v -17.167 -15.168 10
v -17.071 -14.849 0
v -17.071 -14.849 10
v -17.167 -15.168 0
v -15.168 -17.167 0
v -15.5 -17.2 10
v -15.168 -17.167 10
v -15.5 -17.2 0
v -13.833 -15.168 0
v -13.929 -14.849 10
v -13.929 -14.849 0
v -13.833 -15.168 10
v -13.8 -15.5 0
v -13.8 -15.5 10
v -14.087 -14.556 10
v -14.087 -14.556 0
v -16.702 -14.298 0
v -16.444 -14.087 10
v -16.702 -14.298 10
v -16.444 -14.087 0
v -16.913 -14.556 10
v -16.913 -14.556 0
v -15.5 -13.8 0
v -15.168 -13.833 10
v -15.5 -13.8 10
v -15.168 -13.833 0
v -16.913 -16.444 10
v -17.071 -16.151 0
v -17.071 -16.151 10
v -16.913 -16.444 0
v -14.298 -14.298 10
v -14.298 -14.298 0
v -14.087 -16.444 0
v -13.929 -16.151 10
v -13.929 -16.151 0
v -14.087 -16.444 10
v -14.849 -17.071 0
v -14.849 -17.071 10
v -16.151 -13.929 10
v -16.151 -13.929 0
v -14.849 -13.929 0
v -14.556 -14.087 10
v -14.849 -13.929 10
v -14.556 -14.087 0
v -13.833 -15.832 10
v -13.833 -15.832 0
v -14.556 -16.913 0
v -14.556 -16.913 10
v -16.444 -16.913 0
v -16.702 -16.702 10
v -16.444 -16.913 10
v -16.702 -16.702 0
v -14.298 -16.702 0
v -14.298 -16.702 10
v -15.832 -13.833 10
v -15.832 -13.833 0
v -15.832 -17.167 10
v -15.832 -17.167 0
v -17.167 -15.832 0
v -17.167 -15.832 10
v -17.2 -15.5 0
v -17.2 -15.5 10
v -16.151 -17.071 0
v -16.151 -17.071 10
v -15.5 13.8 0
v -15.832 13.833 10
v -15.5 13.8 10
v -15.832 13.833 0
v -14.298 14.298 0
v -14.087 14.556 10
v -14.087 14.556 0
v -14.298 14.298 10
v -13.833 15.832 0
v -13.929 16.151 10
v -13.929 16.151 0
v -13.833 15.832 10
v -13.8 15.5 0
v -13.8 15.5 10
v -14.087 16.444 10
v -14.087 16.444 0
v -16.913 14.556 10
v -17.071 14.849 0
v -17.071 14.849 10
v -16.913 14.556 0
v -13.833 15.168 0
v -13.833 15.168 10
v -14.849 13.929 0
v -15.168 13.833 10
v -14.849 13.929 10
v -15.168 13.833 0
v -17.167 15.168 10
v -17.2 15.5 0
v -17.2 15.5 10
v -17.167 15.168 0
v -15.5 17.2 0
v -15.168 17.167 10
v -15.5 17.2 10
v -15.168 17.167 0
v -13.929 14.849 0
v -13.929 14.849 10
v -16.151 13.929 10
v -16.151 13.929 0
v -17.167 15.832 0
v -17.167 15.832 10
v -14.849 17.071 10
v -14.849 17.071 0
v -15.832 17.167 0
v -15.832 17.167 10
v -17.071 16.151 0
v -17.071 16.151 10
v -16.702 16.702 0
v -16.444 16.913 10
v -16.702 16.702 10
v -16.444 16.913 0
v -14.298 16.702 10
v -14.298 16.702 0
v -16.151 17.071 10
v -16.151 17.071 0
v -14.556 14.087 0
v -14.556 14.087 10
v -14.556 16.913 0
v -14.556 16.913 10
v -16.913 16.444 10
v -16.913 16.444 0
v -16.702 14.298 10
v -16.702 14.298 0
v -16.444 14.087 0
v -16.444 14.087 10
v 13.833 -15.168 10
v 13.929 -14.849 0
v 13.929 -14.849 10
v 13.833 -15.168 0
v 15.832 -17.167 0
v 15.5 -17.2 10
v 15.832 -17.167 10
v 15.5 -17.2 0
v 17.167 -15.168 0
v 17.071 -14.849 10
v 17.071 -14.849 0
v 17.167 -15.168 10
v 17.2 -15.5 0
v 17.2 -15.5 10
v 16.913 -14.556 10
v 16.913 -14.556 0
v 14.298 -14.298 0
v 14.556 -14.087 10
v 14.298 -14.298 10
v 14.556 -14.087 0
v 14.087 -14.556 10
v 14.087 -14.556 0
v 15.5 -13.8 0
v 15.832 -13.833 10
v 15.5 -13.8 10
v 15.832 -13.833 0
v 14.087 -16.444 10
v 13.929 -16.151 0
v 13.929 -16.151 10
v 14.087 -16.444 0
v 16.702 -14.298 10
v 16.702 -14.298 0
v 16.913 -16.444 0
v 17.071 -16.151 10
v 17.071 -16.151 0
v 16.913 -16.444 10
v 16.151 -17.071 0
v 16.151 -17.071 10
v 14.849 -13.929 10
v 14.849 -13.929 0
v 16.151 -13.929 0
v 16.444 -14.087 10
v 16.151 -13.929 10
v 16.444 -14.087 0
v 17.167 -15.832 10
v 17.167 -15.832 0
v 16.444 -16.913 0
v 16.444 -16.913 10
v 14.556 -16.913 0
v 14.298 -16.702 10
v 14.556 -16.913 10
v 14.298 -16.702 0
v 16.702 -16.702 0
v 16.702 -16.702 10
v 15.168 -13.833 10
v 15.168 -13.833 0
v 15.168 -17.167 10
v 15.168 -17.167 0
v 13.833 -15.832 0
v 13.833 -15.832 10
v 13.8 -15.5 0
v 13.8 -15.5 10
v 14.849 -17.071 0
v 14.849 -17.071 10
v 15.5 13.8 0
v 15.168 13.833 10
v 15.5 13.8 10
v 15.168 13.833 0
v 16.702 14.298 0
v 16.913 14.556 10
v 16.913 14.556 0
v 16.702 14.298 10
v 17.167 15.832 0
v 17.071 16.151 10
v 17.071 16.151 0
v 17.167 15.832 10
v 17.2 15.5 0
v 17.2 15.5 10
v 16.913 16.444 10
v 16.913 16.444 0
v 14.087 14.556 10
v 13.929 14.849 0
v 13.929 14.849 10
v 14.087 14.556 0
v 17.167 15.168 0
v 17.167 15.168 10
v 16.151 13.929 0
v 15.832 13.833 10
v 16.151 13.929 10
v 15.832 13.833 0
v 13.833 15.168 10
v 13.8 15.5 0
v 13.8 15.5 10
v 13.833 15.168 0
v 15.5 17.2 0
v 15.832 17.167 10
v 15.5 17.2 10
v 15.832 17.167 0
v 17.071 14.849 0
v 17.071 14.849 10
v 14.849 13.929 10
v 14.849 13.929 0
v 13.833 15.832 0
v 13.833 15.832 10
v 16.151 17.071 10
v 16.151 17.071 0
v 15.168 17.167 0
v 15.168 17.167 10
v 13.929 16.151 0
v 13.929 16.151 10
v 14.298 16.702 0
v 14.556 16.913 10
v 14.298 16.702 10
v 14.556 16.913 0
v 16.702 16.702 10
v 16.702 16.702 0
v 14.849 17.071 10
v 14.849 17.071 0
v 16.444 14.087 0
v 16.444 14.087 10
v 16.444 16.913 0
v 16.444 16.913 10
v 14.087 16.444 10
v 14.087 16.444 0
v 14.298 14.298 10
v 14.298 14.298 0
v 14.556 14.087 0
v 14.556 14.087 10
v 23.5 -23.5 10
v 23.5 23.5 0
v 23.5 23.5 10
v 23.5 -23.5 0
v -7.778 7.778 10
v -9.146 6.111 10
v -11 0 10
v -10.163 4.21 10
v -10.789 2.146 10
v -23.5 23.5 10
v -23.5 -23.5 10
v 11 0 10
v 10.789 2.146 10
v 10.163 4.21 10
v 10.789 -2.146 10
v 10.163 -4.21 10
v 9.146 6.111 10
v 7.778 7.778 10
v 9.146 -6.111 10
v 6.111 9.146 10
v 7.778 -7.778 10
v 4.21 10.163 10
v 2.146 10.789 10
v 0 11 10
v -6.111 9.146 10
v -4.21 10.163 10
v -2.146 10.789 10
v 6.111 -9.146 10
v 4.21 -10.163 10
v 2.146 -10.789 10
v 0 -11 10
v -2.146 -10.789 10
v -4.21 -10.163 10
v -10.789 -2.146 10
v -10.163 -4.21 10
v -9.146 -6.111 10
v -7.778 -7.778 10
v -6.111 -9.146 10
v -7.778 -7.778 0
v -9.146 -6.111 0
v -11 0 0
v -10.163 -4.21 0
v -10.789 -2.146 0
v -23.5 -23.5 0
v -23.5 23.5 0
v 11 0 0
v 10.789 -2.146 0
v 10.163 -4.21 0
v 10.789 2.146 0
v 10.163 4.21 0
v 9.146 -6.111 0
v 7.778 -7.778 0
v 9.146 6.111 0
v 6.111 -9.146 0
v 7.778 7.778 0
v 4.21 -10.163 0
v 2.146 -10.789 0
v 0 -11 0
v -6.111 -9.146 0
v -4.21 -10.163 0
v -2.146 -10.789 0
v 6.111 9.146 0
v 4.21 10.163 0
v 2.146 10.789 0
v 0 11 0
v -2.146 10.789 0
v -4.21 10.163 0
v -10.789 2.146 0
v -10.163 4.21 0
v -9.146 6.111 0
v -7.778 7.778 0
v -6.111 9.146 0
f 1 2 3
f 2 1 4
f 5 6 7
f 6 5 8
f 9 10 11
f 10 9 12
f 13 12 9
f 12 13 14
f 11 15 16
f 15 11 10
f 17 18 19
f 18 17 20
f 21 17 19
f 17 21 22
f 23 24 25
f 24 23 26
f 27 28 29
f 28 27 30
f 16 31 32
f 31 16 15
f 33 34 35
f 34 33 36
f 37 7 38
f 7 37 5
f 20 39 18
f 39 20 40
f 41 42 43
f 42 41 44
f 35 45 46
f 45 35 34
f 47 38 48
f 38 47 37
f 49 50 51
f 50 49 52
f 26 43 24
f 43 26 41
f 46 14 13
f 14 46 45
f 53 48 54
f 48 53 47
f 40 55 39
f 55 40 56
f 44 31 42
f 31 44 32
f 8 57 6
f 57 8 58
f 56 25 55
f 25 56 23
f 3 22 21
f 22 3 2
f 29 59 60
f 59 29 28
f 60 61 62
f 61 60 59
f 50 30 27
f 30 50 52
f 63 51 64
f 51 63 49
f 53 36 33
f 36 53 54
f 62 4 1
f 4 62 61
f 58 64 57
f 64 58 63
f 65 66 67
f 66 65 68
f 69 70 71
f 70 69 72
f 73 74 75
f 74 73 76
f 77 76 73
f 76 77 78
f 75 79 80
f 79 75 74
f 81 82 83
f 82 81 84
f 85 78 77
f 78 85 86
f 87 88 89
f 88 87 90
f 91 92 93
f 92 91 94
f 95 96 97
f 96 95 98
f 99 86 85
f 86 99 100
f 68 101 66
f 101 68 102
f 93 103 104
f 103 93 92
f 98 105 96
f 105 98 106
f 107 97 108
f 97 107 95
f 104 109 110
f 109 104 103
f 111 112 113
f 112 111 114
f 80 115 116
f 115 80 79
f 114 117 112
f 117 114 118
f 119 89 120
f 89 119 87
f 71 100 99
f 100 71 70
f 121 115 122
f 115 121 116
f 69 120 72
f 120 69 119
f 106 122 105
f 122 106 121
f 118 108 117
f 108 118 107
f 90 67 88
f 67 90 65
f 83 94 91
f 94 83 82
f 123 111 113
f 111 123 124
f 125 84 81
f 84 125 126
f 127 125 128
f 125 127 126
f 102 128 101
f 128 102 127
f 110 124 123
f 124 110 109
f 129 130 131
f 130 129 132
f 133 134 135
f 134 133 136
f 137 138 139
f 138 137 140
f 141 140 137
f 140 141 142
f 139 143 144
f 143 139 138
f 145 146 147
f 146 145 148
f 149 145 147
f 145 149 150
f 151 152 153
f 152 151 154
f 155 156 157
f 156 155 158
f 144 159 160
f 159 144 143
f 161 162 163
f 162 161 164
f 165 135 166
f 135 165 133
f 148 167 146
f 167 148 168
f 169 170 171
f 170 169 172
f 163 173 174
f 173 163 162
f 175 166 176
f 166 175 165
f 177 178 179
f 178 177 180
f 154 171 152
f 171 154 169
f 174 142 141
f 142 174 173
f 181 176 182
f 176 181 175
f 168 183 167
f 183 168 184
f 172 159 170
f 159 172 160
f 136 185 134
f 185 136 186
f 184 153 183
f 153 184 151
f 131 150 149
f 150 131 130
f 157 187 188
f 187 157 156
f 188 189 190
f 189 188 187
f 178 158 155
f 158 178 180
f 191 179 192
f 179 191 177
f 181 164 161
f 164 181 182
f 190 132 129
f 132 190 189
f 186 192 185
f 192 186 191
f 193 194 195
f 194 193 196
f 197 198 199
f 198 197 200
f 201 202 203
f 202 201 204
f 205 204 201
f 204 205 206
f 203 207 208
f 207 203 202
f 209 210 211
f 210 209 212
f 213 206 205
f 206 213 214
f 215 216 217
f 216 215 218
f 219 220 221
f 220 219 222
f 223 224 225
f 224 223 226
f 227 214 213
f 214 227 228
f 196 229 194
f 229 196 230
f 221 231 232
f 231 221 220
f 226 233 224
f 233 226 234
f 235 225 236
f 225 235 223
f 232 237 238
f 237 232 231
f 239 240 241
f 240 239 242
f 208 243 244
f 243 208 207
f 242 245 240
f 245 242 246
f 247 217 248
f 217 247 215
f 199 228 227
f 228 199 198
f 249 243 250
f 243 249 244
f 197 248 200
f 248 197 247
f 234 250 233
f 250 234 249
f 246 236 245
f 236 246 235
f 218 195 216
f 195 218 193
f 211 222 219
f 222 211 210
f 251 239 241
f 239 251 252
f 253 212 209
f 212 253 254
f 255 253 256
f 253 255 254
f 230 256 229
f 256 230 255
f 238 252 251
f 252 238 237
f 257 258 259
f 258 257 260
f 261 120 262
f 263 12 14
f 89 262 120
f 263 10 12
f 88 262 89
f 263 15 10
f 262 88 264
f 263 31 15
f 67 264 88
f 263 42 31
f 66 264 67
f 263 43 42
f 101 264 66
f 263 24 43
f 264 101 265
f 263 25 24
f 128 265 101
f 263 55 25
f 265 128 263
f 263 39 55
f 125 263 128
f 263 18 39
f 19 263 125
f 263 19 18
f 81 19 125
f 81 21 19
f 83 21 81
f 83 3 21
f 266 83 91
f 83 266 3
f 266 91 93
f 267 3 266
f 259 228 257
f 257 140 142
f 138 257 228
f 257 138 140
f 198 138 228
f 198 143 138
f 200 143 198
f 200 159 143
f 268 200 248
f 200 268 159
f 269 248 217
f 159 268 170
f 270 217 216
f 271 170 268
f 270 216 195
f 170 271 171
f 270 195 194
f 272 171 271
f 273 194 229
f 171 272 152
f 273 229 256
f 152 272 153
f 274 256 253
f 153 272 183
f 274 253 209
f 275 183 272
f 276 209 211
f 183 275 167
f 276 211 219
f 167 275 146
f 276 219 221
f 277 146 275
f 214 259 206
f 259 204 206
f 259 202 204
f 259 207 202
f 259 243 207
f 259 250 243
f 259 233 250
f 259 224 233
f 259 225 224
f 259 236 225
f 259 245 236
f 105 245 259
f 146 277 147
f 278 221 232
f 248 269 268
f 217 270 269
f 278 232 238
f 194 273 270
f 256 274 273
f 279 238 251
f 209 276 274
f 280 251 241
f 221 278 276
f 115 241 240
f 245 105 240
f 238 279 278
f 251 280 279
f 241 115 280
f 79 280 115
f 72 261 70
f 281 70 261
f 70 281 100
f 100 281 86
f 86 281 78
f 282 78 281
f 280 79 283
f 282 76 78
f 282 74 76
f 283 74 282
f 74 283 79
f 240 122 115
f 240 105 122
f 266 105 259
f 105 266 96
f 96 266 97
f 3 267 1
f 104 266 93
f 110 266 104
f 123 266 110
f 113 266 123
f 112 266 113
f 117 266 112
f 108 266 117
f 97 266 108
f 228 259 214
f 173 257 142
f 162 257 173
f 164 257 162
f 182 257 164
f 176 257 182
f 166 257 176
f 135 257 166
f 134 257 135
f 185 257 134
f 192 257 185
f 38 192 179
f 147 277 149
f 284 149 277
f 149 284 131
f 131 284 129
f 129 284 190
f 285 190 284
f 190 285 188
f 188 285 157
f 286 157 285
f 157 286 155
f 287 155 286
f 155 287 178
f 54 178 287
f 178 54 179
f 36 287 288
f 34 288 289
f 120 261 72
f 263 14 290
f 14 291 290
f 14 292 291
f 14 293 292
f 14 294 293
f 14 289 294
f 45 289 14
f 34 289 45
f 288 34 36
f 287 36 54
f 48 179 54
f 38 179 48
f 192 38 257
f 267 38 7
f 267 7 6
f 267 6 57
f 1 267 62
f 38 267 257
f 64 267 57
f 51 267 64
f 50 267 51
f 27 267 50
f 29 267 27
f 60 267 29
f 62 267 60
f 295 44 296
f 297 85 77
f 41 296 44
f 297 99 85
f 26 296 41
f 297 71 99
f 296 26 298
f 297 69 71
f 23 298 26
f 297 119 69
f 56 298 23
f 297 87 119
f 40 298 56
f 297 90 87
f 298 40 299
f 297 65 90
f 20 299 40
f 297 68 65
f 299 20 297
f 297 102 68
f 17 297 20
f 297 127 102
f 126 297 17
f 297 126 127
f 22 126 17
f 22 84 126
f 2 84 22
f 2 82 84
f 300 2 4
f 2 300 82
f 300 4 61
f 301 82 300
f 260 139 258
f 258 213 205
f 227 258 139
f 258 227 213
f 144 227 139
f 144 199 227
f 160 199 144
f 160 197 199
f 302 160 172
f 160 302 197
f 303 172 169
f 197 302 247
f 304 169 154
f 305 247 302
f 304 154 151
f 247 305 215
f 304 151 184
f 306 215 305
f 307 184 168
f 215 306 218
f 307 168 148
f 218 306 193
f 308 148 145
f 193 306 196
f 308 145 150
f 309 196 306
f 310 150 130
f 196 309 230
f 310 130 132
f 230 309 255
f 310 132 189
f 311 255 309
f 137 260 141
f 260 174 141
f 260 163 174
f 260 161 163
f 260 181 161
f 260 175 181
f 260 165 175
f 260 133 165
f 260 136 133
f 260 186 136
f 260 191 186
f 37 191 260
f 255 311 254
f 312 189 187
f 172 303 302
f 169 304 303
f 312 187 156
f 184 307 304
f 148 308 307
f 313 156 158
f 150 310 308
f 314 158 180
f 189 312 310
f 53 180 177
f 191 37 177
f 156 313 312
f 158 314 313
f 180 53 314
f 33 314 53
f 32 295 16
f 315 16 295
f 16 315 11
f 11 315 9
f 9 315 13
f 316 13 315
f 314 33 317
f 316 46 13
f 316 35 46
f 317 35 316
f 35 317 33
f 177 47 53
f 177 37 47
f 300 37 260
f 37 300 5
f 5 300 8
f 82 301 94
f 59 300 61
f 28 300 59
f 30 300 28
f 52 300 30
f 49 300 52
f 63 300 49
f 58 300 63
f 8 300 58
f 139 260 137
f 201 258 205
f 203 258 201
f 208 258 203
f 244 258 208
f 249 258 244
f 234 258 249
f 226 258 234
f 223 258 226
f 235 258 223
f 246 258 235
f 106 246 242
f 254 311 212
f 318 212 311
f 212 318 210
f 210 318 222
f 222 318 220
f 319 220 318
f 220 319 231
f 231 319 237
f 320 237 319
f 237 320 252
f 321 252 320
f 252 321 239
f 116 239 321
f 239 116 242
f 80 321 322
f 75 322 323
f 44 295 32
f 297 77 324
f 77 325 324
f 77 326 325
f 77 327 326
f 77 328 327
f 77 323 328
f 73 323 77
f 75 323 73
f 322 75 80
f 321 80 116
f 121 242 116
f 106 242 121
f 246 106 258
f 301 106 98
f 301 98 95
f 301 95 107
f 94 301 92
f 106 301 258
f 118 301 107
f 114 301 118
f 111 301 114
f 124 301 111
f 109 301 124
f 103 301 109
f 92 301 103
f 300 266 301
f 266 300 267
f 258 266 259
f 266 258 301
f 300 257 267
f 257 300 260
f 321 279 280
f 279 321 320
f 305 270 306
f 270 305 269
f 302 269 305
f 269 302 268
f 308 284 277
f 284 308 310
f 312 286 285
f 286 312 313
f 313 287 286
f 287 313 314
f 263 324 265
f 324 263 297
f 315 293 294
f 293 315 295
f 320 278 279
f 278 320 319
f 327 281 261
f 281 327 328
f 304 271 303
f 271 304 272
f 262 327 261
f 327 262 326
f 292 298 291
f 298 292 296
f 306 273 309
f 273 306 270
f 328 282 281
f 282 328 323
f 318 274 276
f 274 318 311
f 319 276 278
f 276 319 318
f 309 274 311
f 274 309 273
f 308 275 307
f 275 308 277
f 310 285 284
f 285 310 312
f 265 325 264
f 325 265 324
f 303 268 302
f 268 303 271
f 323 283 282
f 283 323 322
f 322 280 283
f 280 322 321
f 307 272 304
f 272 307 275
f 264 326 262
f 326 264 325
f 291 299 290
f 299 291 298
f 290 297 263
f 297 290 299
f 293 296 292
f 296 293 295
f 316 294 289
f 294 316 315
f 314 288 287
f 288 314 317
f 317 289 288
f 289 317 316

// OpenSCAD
$fn = 32;

// ----------------------------------------------------------------------
// Motor mount plate: NEMA17, 47 x 47 x 10 mm
// ----------------------------------------------------------------------

// --- parameters (mm) ---
mount_w = 47;             // plate length, X
mount_d = 47;             // plate width, Y
mat_t = 10;               // plate thickness
motor_pitch = 31;         // NEMA17 bolt spacing
motor_d = 3.4;            // NEMA17 screw clearance
center_bore = 22;         // pilot boss bore

module plate() {
  translate([-mount_w / 2, -mount_d / 2, 0]) cube([mount_w, mount_d, mat_t]);
}

module motor_holes() {
  for (sx = [-1, 1]) for (sy = [-1, 1])
    translate([sx * motor_pitch / 2, sy * motor_pitch / 2, -1])
      cylinder(h = mat_t + 2, d = motor_d);
}

difference() {
  union() {
    plate();
  }
  motor_holes();
  translate([0, 0, -1]) cylinder(h = mat_t + 2, d = center_bore);
}
